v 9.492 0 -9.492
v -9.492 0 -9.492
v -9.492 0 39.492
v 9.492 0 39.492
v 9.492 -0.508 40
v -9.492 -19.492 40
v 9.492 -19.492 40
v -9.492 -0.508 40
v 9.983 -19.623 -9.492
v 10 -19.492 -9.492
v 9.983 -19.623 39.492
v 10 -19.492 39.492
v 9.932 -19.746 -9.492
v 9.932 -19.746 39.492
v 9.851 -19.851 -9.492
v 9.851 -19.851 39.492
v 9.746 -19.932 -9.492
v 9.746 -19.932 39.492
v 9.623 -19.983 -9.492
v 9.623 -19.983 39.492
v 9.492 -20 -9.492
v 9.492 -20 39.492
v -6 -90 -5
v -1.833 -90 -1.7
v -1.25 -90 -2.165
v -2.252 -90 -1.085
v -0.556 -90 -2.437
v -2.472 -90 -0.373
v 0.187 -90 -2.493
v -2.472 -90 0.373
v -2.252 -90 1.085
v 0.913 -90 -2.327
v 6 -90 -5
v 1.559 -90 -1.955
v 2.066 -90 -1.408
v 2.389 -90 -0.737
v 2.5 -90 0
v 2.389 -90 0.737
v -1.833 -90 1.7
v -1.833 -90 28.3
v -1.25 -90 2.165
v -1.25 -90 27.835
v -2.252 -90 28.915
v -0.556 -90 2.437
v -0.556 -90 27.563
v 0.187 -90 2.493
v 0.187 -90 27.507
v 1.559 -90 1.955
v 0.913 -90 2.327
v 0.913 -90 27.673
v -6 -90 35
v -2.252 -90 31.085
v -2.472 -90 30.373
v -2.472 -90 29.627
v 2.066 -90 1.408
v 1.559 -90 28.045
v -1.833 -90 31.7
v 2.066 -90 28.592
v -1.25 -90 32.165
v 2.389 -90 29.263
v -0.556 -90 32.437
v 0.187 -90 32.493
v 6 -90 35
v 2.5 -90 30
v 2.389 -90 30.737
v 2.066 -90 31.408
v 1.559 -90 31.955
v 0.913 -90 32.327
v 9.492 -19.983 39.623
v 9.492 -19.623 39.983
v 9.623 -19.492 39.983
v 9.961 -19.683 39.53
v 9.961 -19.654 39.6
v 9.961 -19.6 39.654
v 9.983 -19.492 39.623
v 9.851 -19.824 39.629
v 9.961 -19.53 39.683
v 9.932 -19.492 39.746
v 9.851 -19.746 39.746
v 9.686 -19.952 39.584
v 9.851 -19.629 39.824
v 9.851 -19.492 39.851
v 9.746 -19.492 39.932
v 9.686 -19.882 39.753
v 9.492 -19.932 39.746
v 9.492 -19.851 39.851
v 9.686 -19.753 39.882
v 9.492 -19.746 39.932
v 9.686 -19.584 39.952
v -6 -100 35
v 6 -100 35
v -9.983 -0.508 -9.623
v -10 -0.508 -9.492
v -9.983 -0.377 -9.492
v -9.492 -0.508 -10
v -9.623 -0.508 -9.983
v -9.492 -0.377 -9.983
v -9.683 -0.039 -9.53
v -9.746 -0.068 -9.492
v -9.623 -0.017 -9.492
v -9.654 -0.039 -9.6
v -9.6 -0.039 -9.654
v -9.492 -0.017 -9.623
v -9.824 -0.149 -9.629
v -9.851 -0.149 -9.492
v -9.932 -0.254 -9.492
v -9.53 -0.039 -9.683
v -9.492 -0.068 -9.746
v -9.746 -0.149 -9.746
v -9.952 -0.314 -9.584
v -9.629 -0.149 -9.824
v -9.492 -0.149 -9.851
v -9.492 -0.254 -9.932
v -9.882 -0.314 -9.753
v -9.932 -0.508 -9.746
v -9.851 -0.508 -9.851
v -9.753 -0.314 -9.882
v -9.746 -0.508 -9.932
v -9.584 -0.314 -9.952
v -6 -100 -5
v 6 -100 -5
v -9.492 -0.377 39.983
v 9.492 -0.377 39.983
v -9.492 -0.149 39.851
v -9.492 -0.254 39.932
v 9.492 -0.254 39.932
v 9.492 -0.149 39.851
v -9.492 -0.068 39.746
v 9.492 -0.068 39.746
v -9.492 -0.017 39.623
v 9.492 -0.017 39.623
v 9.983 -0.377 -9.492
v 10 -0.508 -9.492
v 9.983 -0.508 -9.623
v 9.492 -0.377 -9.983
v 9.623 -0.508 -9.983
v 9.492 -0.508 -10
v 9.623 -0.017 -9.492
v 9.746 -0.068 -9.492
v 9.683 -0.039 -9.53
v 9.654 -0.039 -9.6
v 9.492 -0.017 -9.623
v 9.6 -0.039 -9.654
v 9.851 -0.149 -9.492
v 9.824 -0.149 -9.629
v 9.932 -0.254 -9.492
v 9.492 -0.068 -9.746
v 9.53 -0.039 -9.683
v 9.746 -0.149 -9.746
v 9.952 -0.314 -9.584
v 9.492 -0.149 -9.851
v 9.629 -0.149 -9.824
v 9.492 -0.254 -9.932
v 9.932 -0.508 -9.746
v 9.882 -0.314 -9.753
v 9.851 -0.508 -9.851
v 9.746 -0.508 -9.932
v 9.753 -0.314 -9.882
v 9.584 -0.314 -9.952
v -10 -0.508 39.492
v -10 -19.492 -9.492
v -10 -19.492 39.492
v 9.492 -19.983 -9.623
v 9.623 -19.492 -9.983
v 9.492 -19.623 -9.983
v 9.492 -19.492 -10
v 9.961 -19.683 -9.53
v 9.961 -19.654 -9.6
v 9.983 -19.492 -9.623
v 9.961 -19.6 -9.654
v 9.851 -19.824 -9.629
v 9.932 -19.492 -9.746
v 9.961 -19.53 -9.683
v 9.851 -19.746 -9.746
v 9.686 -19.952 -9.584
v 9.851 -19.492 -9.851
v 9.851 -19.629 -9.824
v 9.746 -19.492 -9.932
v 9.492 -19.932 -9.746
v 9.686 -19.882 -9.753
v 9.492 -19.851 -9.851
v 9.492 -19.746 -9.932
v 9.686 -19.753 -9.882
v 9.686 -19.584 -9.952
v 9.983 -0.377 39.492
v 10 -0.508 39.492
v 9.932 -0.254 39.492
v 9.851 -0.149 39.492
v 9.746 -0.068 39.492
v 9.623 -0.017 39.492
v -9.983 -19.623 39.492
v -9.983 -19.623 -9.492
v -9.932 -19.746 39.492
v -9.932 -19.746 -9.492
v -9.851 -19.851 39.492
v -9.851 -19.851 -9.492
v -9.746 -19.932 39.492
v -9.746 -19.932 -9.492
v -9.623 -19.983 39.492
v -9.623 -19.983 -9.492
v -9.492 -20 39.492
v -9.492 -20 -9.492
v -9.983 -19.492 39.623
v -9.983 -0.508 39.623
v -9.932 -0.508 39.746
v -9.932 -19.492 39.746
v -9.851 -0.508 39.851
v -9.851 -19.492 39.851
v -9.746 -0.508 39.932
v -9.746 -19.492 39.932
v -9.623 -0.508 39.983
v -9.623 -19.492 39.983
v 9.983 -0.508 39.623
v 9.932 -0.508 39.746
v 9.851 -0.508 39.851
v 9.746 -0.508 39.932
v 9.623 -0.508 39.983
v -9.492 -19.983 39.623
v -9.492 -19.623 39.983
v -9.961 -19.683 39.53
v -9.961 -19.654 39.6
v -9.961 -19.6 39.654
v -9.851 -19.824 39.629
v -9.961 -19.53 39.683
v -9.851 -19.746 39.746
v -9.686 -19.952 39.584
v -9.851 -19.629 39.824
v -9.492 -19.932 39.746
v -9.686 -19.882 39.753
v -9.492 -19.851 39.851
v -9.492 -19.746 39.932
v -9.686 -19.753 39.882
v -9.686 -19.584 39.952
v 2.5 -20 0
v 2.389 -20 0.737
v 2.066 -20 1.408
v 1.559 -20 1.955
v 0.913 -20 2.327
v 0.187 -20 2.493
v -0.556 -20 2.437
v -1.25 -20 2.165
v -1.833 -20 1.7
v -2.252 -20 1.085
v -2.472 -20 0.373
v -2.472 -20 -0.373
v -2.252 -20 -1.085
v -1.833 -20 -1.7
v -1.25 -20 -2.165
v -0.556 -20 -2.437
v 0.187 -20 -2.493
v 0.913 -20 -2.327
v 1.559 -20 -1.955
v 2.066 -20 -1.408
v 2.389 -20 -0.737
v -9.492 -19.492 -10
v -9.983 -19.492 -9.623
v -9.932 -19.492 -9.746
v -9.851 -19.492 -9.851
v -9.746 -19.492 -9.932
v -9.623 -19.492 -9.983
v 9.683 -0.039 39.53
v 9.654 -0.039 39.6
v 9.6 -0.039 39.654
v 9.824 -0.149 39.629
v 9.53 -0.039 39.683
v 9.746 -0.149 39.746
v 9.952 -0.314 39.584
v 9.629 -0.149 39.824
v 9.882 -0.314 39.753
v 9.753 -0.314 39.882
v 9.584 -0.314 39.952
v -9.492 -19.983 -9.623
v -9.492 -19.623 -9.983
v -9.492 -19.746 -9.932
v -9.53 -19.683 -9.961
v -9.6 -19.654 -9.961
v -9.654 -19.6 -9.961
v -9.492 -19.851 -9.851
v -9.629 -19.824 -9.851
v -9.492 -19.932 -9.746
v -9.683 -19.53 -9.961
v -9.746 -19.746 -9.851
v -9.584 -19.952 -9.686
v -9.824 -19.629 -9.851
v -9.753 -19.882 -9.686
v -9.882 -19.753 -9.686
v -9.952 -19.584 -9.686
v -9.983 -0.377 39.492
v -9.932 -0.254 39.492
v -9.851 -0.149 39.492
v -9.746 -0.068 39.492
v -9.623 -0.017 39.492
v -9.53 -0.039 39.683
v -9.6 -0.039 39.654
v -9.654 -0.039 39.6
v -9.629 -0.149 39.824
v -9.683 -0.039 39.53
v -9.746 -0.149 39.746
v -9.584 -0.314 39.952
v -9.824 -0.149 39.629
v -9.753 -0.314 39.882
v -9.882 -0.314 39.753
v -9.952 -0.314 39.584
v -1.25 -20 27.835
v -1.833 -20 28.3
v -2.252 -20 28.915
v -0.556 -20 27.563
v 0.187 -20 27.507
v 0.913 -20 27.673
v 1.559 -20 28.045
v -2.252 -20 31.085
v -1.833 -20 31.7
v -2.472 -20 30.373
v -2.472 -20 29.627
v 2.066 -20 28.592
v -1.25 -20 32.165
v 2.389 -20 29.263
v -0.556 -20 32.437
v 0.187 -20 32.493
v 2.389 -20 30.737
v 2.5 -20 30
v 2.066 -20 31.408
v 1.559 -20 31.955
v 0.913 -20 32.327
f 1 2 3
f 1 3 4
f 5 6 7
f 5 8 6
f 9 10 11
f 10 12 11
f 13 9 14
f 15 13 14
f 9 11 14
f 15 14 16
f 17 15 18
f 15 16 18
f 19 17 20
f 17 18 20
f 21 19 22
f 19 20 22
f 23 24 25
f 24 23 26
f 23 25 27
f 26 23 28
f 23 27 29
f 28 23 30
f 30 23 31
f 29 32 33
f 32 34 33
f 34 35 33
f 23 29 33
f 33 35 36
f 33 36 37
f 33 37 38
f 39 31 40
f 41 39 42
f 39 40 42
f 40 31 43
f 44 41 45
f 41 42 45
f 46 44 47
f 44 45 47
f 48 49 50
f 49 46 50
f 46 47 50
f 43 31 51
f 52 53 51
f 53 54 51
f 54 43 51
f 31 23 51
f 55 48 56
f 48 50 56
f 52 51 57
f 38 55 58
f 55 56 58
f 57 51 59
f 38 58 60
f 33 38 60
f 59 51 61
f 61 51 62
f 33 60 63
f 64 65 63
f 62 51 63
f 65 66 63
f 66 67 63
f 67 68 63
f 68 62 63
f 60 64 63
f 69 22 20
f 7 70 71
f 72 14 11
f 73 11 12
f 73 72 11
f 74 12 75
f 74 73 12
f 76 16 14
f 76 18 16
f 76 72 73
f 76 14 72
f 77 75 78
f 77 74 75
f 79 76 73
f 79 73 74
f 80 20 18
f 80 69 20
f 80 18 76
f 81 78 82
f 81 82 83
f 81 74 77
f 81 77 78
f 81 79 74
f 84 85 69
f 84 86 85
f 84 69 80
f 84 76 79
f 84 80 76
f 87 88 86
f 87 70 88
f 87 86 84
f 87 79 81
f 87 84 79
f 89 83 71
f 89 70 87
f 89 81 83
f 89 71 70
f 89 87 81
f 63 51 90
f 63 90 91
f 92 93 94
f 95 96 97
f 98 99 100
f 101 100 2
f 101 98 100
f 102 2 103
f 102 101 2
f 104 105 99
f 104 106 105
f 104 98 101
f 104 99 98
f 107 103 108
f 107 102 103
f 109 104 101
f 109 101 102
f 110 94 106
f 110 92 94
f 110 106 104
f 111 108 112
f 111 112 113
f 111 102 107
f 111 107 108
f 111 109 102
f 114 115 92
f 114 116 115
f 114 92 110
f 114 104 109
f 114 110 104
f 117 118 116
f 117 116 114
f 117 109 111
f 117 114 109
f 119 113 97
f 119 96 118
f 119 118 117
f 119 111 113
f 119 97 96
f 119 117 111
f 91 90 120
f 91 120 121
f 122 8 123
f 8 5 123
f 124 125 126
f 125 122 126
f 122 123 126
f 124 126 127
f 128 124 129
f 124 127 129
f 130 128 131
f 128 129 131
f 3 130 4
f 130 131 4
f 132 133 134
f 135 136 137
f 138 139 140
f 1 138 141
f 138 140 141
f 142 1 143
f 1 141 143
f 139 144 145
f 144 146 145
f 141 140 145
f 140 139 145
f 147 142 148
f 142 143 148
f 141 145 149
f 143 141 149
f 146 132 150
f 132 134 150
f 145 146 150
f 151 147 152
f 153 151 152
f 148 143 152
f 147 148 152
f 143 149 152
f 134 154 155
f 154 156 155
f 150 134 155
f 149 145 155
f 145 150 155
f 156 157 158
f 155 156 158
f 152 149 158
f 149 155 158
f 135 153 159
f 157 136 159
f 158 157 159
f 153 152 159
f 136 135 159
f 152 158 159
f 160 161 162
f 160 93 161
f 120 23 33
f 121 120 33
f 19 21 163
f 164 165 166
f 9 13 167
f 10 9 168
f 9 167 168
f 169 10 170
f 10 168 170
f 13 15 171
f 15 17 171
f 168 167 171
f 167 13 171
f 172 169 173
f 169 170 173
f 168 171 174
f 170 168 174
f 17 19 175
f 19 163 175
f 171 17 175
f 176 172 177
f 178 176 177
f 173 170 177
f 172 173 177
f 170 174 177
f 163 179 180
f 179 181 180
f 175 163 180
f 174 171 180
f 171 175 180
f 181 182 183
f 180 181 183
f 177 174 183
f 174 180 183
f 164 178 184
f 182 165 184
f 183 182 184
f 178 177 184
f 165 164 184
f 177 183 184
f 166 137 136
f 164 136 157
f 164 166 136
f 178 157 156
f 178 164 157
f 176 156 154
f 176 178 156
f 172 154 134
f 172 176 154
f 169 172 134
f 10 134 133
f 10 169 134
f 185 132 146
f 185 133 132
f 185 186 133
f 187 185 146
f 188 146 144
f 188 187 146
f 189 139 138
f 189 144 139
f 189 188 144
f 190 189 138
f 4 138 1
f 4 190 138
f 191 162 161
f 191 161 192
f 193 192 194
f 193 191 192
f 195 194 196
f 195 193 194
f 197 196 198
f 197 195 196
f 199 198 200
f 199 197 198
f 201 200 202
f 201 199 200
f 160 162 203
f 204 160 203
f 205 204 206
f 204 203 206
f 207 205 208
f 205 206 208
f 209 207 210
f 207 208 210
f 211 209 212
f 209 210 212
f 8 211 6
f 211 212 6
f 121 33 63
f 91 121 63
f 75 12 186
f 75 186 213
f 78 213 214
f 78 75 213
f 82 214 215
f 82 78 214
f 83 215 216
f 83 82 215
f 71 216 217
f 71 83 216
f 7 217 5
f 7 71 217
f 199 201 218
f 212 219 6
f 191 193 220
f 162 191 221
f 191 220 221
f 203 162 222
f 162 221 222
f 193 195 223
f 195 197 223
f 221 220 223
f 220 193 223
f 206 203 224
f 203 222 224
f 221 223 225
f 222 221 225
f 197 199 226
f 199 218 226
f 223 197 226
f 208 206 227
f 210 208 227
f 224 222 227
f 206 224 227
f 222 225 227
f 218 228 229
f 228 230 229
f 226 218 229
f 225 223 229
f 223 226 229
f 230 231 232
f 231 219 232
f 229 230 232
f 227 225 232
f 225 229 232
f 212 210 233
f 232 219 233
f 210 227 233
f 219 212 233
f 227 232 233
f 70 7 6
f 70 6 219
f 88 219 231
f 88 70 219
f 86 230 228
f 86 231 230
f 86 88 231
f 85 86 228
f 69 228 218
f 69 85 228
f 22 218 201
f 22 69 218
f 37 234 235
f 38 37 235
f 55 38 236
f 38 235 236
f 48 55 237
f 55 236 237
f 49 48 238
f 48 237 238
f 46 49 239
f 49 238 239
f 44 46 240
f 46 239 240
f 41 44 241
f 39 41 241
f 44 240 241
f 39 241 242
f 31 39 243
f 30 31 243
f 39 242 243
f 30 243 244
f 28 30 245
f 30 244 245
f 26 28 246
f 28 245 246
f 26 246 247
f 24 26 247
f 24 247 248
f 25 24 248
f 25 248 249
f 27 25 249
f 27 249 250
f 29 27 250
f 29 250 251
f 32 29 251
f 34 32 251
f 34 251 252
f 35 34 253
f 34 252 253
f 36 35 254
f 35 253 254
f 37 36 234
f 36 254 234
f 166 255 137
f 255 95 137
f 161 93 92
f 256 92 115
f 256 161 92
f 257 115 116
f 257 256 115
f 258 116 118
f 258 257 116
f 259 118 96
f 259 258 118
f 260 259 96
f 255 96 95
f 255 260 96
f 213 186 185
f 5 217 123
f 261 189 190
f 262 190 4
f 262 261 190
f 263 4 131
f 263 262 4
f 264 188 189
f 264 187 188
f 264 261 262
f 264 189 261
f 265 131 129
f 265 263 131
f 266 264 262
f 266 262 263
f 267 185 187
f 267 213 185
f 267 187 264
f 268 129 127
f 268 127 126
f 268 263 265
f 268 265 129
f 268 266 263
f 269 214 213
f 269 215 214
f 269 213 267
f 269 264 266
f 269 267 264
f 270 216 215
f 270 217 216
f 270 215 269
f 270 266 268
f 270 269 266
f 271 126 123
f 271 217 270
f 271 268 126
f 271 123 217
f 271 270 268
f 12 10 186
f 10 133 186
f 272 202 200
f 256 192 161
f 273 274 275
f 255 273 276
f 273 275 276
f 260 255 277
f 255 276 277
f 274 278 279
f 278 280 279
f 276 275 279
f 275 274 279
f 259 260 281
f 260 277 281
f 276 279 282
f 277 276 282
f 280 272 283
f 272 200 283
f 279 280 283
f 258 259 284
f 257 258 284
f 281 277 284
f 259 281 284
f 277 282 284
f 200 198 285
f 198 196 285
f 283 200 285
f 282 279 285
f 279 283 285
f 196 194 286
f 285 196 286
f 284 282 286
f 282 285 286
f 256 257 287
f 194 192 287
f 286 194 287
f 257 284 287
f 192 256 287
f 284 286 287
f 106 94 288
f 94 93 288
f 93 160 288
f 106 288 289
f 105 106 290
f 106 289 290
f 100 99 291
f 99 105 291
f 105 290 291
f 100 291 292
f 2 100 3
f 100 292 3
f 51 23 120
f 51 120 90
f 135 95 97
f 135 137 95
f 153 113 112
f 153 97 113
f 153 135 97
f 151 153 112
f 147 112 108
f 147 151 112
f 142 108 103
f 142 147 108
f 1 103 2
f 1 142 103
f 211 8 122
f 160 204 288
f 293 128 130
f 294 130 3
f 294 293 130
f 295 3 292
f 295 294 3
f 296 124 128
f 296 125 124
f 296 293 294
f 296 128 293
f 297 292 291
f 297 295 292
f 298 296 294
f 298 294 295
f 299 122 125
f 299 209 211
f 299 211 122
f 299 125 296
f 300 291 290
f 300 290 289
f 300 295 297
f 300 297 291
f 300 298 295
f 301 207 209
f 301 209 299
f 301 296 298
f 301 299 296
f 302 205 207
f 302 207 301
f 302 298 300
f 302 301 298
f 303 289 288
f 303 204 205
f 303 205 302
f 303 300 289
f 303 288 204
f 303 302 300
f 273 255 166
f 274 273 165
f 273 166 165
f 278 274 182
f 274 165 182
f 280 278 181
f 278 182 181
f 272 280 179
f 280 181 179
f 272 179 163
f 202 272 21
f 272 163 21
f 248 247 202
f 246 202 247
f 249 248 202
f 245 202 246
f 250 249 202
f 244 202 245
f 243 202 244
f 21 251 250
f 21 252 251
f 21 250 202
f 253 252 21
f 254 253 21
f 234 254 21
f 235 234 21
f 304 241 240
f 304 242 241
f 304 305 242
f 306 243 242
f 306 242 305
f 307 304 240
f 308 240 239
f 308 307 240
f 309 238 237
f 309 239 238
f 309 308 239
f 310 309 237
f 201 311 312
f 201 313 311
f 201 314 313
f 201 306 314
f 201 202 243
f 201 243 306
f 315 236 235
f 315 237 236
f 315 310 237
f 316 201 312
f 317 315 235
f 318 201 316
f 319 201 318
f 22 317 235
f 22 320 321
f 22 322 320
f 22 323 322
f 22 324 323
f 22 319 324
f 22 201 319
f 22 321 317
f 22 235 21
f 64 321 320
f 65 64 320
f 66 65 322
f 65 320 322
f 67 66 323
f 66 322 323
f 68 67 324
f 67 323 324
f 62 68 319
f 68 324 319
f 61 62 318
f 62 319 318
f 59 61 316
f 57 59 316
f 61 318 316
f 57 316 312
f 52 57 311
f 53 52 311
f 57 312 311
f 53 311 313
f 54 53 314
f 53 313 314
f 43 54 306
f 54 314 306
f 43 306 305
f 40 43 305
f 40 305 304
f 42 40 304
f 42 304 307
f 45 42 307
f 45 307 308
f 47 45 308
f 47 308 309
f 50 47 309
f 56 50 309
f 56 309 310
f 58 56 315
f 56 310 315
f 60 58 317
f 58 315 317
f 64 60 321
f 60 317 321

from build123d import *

# Parameters (mm, degrees)
F0_W     = 20
F0_H     = 50
F1_DEPTH = 20
F2_R     = 0.508
F3_R     = 2.5
F4_DEPTH = 70
F5_W     = 12
F5_H     = 40
F5_R     = 2.5
F6_DEPTH = 10


# Not quite as in the source:
# - a feature names something its author has since deleted; it is built from what else it names


with BuildPart() as f1:
    # F0 (on Front) → F1 (new body)
    with BuildSketch(Plane.XZ):
        with Locations((0, 15)):
            Rectangle(F0_W, F0_H)
    extrude(amount=F1_DEPTH)

    # F2
    f2_edges = [f1.edges().sort_by_distance(p)[0] for p in [
        (0, -20, 40),
        (-10, -20, 15),
        (0, -20, -10),
        (10, -20, 15),
        (10, -10, -10),
        (10, -10, 40),
        (10, 0, 15),
        (-10, -10, 40),
        (0, 0, 40),
        (-10, -10, -10),
        (-10, 0, 15),
        (0, 0, -10),
    ]]
    fillet(f2_edges, radius=F2_R)

    # F3 (on face) → F4 (join)
    with BuildSketch(Plane.XZ.offset(20)):
        with Locations((0, 30)):
            Circle(F3_R)
        Circle(F3_R)
    extrude(amount=F4_DEPTH)

    # F5 (on face) → F6 (join)
    with BuildSketch(Plane.XZ.offset(90)):
        with Locations((0, 15)):
            Rectangle(F5_W, F5_H)
        with Locations((0, 30)):
            Circle(F5_R, mode=Mode.SUBTRACT)
        with Locations((0, 30)):
            Circle(F5_R)
    extrude(amount=F6_DEPTH)


solid = f1.part
